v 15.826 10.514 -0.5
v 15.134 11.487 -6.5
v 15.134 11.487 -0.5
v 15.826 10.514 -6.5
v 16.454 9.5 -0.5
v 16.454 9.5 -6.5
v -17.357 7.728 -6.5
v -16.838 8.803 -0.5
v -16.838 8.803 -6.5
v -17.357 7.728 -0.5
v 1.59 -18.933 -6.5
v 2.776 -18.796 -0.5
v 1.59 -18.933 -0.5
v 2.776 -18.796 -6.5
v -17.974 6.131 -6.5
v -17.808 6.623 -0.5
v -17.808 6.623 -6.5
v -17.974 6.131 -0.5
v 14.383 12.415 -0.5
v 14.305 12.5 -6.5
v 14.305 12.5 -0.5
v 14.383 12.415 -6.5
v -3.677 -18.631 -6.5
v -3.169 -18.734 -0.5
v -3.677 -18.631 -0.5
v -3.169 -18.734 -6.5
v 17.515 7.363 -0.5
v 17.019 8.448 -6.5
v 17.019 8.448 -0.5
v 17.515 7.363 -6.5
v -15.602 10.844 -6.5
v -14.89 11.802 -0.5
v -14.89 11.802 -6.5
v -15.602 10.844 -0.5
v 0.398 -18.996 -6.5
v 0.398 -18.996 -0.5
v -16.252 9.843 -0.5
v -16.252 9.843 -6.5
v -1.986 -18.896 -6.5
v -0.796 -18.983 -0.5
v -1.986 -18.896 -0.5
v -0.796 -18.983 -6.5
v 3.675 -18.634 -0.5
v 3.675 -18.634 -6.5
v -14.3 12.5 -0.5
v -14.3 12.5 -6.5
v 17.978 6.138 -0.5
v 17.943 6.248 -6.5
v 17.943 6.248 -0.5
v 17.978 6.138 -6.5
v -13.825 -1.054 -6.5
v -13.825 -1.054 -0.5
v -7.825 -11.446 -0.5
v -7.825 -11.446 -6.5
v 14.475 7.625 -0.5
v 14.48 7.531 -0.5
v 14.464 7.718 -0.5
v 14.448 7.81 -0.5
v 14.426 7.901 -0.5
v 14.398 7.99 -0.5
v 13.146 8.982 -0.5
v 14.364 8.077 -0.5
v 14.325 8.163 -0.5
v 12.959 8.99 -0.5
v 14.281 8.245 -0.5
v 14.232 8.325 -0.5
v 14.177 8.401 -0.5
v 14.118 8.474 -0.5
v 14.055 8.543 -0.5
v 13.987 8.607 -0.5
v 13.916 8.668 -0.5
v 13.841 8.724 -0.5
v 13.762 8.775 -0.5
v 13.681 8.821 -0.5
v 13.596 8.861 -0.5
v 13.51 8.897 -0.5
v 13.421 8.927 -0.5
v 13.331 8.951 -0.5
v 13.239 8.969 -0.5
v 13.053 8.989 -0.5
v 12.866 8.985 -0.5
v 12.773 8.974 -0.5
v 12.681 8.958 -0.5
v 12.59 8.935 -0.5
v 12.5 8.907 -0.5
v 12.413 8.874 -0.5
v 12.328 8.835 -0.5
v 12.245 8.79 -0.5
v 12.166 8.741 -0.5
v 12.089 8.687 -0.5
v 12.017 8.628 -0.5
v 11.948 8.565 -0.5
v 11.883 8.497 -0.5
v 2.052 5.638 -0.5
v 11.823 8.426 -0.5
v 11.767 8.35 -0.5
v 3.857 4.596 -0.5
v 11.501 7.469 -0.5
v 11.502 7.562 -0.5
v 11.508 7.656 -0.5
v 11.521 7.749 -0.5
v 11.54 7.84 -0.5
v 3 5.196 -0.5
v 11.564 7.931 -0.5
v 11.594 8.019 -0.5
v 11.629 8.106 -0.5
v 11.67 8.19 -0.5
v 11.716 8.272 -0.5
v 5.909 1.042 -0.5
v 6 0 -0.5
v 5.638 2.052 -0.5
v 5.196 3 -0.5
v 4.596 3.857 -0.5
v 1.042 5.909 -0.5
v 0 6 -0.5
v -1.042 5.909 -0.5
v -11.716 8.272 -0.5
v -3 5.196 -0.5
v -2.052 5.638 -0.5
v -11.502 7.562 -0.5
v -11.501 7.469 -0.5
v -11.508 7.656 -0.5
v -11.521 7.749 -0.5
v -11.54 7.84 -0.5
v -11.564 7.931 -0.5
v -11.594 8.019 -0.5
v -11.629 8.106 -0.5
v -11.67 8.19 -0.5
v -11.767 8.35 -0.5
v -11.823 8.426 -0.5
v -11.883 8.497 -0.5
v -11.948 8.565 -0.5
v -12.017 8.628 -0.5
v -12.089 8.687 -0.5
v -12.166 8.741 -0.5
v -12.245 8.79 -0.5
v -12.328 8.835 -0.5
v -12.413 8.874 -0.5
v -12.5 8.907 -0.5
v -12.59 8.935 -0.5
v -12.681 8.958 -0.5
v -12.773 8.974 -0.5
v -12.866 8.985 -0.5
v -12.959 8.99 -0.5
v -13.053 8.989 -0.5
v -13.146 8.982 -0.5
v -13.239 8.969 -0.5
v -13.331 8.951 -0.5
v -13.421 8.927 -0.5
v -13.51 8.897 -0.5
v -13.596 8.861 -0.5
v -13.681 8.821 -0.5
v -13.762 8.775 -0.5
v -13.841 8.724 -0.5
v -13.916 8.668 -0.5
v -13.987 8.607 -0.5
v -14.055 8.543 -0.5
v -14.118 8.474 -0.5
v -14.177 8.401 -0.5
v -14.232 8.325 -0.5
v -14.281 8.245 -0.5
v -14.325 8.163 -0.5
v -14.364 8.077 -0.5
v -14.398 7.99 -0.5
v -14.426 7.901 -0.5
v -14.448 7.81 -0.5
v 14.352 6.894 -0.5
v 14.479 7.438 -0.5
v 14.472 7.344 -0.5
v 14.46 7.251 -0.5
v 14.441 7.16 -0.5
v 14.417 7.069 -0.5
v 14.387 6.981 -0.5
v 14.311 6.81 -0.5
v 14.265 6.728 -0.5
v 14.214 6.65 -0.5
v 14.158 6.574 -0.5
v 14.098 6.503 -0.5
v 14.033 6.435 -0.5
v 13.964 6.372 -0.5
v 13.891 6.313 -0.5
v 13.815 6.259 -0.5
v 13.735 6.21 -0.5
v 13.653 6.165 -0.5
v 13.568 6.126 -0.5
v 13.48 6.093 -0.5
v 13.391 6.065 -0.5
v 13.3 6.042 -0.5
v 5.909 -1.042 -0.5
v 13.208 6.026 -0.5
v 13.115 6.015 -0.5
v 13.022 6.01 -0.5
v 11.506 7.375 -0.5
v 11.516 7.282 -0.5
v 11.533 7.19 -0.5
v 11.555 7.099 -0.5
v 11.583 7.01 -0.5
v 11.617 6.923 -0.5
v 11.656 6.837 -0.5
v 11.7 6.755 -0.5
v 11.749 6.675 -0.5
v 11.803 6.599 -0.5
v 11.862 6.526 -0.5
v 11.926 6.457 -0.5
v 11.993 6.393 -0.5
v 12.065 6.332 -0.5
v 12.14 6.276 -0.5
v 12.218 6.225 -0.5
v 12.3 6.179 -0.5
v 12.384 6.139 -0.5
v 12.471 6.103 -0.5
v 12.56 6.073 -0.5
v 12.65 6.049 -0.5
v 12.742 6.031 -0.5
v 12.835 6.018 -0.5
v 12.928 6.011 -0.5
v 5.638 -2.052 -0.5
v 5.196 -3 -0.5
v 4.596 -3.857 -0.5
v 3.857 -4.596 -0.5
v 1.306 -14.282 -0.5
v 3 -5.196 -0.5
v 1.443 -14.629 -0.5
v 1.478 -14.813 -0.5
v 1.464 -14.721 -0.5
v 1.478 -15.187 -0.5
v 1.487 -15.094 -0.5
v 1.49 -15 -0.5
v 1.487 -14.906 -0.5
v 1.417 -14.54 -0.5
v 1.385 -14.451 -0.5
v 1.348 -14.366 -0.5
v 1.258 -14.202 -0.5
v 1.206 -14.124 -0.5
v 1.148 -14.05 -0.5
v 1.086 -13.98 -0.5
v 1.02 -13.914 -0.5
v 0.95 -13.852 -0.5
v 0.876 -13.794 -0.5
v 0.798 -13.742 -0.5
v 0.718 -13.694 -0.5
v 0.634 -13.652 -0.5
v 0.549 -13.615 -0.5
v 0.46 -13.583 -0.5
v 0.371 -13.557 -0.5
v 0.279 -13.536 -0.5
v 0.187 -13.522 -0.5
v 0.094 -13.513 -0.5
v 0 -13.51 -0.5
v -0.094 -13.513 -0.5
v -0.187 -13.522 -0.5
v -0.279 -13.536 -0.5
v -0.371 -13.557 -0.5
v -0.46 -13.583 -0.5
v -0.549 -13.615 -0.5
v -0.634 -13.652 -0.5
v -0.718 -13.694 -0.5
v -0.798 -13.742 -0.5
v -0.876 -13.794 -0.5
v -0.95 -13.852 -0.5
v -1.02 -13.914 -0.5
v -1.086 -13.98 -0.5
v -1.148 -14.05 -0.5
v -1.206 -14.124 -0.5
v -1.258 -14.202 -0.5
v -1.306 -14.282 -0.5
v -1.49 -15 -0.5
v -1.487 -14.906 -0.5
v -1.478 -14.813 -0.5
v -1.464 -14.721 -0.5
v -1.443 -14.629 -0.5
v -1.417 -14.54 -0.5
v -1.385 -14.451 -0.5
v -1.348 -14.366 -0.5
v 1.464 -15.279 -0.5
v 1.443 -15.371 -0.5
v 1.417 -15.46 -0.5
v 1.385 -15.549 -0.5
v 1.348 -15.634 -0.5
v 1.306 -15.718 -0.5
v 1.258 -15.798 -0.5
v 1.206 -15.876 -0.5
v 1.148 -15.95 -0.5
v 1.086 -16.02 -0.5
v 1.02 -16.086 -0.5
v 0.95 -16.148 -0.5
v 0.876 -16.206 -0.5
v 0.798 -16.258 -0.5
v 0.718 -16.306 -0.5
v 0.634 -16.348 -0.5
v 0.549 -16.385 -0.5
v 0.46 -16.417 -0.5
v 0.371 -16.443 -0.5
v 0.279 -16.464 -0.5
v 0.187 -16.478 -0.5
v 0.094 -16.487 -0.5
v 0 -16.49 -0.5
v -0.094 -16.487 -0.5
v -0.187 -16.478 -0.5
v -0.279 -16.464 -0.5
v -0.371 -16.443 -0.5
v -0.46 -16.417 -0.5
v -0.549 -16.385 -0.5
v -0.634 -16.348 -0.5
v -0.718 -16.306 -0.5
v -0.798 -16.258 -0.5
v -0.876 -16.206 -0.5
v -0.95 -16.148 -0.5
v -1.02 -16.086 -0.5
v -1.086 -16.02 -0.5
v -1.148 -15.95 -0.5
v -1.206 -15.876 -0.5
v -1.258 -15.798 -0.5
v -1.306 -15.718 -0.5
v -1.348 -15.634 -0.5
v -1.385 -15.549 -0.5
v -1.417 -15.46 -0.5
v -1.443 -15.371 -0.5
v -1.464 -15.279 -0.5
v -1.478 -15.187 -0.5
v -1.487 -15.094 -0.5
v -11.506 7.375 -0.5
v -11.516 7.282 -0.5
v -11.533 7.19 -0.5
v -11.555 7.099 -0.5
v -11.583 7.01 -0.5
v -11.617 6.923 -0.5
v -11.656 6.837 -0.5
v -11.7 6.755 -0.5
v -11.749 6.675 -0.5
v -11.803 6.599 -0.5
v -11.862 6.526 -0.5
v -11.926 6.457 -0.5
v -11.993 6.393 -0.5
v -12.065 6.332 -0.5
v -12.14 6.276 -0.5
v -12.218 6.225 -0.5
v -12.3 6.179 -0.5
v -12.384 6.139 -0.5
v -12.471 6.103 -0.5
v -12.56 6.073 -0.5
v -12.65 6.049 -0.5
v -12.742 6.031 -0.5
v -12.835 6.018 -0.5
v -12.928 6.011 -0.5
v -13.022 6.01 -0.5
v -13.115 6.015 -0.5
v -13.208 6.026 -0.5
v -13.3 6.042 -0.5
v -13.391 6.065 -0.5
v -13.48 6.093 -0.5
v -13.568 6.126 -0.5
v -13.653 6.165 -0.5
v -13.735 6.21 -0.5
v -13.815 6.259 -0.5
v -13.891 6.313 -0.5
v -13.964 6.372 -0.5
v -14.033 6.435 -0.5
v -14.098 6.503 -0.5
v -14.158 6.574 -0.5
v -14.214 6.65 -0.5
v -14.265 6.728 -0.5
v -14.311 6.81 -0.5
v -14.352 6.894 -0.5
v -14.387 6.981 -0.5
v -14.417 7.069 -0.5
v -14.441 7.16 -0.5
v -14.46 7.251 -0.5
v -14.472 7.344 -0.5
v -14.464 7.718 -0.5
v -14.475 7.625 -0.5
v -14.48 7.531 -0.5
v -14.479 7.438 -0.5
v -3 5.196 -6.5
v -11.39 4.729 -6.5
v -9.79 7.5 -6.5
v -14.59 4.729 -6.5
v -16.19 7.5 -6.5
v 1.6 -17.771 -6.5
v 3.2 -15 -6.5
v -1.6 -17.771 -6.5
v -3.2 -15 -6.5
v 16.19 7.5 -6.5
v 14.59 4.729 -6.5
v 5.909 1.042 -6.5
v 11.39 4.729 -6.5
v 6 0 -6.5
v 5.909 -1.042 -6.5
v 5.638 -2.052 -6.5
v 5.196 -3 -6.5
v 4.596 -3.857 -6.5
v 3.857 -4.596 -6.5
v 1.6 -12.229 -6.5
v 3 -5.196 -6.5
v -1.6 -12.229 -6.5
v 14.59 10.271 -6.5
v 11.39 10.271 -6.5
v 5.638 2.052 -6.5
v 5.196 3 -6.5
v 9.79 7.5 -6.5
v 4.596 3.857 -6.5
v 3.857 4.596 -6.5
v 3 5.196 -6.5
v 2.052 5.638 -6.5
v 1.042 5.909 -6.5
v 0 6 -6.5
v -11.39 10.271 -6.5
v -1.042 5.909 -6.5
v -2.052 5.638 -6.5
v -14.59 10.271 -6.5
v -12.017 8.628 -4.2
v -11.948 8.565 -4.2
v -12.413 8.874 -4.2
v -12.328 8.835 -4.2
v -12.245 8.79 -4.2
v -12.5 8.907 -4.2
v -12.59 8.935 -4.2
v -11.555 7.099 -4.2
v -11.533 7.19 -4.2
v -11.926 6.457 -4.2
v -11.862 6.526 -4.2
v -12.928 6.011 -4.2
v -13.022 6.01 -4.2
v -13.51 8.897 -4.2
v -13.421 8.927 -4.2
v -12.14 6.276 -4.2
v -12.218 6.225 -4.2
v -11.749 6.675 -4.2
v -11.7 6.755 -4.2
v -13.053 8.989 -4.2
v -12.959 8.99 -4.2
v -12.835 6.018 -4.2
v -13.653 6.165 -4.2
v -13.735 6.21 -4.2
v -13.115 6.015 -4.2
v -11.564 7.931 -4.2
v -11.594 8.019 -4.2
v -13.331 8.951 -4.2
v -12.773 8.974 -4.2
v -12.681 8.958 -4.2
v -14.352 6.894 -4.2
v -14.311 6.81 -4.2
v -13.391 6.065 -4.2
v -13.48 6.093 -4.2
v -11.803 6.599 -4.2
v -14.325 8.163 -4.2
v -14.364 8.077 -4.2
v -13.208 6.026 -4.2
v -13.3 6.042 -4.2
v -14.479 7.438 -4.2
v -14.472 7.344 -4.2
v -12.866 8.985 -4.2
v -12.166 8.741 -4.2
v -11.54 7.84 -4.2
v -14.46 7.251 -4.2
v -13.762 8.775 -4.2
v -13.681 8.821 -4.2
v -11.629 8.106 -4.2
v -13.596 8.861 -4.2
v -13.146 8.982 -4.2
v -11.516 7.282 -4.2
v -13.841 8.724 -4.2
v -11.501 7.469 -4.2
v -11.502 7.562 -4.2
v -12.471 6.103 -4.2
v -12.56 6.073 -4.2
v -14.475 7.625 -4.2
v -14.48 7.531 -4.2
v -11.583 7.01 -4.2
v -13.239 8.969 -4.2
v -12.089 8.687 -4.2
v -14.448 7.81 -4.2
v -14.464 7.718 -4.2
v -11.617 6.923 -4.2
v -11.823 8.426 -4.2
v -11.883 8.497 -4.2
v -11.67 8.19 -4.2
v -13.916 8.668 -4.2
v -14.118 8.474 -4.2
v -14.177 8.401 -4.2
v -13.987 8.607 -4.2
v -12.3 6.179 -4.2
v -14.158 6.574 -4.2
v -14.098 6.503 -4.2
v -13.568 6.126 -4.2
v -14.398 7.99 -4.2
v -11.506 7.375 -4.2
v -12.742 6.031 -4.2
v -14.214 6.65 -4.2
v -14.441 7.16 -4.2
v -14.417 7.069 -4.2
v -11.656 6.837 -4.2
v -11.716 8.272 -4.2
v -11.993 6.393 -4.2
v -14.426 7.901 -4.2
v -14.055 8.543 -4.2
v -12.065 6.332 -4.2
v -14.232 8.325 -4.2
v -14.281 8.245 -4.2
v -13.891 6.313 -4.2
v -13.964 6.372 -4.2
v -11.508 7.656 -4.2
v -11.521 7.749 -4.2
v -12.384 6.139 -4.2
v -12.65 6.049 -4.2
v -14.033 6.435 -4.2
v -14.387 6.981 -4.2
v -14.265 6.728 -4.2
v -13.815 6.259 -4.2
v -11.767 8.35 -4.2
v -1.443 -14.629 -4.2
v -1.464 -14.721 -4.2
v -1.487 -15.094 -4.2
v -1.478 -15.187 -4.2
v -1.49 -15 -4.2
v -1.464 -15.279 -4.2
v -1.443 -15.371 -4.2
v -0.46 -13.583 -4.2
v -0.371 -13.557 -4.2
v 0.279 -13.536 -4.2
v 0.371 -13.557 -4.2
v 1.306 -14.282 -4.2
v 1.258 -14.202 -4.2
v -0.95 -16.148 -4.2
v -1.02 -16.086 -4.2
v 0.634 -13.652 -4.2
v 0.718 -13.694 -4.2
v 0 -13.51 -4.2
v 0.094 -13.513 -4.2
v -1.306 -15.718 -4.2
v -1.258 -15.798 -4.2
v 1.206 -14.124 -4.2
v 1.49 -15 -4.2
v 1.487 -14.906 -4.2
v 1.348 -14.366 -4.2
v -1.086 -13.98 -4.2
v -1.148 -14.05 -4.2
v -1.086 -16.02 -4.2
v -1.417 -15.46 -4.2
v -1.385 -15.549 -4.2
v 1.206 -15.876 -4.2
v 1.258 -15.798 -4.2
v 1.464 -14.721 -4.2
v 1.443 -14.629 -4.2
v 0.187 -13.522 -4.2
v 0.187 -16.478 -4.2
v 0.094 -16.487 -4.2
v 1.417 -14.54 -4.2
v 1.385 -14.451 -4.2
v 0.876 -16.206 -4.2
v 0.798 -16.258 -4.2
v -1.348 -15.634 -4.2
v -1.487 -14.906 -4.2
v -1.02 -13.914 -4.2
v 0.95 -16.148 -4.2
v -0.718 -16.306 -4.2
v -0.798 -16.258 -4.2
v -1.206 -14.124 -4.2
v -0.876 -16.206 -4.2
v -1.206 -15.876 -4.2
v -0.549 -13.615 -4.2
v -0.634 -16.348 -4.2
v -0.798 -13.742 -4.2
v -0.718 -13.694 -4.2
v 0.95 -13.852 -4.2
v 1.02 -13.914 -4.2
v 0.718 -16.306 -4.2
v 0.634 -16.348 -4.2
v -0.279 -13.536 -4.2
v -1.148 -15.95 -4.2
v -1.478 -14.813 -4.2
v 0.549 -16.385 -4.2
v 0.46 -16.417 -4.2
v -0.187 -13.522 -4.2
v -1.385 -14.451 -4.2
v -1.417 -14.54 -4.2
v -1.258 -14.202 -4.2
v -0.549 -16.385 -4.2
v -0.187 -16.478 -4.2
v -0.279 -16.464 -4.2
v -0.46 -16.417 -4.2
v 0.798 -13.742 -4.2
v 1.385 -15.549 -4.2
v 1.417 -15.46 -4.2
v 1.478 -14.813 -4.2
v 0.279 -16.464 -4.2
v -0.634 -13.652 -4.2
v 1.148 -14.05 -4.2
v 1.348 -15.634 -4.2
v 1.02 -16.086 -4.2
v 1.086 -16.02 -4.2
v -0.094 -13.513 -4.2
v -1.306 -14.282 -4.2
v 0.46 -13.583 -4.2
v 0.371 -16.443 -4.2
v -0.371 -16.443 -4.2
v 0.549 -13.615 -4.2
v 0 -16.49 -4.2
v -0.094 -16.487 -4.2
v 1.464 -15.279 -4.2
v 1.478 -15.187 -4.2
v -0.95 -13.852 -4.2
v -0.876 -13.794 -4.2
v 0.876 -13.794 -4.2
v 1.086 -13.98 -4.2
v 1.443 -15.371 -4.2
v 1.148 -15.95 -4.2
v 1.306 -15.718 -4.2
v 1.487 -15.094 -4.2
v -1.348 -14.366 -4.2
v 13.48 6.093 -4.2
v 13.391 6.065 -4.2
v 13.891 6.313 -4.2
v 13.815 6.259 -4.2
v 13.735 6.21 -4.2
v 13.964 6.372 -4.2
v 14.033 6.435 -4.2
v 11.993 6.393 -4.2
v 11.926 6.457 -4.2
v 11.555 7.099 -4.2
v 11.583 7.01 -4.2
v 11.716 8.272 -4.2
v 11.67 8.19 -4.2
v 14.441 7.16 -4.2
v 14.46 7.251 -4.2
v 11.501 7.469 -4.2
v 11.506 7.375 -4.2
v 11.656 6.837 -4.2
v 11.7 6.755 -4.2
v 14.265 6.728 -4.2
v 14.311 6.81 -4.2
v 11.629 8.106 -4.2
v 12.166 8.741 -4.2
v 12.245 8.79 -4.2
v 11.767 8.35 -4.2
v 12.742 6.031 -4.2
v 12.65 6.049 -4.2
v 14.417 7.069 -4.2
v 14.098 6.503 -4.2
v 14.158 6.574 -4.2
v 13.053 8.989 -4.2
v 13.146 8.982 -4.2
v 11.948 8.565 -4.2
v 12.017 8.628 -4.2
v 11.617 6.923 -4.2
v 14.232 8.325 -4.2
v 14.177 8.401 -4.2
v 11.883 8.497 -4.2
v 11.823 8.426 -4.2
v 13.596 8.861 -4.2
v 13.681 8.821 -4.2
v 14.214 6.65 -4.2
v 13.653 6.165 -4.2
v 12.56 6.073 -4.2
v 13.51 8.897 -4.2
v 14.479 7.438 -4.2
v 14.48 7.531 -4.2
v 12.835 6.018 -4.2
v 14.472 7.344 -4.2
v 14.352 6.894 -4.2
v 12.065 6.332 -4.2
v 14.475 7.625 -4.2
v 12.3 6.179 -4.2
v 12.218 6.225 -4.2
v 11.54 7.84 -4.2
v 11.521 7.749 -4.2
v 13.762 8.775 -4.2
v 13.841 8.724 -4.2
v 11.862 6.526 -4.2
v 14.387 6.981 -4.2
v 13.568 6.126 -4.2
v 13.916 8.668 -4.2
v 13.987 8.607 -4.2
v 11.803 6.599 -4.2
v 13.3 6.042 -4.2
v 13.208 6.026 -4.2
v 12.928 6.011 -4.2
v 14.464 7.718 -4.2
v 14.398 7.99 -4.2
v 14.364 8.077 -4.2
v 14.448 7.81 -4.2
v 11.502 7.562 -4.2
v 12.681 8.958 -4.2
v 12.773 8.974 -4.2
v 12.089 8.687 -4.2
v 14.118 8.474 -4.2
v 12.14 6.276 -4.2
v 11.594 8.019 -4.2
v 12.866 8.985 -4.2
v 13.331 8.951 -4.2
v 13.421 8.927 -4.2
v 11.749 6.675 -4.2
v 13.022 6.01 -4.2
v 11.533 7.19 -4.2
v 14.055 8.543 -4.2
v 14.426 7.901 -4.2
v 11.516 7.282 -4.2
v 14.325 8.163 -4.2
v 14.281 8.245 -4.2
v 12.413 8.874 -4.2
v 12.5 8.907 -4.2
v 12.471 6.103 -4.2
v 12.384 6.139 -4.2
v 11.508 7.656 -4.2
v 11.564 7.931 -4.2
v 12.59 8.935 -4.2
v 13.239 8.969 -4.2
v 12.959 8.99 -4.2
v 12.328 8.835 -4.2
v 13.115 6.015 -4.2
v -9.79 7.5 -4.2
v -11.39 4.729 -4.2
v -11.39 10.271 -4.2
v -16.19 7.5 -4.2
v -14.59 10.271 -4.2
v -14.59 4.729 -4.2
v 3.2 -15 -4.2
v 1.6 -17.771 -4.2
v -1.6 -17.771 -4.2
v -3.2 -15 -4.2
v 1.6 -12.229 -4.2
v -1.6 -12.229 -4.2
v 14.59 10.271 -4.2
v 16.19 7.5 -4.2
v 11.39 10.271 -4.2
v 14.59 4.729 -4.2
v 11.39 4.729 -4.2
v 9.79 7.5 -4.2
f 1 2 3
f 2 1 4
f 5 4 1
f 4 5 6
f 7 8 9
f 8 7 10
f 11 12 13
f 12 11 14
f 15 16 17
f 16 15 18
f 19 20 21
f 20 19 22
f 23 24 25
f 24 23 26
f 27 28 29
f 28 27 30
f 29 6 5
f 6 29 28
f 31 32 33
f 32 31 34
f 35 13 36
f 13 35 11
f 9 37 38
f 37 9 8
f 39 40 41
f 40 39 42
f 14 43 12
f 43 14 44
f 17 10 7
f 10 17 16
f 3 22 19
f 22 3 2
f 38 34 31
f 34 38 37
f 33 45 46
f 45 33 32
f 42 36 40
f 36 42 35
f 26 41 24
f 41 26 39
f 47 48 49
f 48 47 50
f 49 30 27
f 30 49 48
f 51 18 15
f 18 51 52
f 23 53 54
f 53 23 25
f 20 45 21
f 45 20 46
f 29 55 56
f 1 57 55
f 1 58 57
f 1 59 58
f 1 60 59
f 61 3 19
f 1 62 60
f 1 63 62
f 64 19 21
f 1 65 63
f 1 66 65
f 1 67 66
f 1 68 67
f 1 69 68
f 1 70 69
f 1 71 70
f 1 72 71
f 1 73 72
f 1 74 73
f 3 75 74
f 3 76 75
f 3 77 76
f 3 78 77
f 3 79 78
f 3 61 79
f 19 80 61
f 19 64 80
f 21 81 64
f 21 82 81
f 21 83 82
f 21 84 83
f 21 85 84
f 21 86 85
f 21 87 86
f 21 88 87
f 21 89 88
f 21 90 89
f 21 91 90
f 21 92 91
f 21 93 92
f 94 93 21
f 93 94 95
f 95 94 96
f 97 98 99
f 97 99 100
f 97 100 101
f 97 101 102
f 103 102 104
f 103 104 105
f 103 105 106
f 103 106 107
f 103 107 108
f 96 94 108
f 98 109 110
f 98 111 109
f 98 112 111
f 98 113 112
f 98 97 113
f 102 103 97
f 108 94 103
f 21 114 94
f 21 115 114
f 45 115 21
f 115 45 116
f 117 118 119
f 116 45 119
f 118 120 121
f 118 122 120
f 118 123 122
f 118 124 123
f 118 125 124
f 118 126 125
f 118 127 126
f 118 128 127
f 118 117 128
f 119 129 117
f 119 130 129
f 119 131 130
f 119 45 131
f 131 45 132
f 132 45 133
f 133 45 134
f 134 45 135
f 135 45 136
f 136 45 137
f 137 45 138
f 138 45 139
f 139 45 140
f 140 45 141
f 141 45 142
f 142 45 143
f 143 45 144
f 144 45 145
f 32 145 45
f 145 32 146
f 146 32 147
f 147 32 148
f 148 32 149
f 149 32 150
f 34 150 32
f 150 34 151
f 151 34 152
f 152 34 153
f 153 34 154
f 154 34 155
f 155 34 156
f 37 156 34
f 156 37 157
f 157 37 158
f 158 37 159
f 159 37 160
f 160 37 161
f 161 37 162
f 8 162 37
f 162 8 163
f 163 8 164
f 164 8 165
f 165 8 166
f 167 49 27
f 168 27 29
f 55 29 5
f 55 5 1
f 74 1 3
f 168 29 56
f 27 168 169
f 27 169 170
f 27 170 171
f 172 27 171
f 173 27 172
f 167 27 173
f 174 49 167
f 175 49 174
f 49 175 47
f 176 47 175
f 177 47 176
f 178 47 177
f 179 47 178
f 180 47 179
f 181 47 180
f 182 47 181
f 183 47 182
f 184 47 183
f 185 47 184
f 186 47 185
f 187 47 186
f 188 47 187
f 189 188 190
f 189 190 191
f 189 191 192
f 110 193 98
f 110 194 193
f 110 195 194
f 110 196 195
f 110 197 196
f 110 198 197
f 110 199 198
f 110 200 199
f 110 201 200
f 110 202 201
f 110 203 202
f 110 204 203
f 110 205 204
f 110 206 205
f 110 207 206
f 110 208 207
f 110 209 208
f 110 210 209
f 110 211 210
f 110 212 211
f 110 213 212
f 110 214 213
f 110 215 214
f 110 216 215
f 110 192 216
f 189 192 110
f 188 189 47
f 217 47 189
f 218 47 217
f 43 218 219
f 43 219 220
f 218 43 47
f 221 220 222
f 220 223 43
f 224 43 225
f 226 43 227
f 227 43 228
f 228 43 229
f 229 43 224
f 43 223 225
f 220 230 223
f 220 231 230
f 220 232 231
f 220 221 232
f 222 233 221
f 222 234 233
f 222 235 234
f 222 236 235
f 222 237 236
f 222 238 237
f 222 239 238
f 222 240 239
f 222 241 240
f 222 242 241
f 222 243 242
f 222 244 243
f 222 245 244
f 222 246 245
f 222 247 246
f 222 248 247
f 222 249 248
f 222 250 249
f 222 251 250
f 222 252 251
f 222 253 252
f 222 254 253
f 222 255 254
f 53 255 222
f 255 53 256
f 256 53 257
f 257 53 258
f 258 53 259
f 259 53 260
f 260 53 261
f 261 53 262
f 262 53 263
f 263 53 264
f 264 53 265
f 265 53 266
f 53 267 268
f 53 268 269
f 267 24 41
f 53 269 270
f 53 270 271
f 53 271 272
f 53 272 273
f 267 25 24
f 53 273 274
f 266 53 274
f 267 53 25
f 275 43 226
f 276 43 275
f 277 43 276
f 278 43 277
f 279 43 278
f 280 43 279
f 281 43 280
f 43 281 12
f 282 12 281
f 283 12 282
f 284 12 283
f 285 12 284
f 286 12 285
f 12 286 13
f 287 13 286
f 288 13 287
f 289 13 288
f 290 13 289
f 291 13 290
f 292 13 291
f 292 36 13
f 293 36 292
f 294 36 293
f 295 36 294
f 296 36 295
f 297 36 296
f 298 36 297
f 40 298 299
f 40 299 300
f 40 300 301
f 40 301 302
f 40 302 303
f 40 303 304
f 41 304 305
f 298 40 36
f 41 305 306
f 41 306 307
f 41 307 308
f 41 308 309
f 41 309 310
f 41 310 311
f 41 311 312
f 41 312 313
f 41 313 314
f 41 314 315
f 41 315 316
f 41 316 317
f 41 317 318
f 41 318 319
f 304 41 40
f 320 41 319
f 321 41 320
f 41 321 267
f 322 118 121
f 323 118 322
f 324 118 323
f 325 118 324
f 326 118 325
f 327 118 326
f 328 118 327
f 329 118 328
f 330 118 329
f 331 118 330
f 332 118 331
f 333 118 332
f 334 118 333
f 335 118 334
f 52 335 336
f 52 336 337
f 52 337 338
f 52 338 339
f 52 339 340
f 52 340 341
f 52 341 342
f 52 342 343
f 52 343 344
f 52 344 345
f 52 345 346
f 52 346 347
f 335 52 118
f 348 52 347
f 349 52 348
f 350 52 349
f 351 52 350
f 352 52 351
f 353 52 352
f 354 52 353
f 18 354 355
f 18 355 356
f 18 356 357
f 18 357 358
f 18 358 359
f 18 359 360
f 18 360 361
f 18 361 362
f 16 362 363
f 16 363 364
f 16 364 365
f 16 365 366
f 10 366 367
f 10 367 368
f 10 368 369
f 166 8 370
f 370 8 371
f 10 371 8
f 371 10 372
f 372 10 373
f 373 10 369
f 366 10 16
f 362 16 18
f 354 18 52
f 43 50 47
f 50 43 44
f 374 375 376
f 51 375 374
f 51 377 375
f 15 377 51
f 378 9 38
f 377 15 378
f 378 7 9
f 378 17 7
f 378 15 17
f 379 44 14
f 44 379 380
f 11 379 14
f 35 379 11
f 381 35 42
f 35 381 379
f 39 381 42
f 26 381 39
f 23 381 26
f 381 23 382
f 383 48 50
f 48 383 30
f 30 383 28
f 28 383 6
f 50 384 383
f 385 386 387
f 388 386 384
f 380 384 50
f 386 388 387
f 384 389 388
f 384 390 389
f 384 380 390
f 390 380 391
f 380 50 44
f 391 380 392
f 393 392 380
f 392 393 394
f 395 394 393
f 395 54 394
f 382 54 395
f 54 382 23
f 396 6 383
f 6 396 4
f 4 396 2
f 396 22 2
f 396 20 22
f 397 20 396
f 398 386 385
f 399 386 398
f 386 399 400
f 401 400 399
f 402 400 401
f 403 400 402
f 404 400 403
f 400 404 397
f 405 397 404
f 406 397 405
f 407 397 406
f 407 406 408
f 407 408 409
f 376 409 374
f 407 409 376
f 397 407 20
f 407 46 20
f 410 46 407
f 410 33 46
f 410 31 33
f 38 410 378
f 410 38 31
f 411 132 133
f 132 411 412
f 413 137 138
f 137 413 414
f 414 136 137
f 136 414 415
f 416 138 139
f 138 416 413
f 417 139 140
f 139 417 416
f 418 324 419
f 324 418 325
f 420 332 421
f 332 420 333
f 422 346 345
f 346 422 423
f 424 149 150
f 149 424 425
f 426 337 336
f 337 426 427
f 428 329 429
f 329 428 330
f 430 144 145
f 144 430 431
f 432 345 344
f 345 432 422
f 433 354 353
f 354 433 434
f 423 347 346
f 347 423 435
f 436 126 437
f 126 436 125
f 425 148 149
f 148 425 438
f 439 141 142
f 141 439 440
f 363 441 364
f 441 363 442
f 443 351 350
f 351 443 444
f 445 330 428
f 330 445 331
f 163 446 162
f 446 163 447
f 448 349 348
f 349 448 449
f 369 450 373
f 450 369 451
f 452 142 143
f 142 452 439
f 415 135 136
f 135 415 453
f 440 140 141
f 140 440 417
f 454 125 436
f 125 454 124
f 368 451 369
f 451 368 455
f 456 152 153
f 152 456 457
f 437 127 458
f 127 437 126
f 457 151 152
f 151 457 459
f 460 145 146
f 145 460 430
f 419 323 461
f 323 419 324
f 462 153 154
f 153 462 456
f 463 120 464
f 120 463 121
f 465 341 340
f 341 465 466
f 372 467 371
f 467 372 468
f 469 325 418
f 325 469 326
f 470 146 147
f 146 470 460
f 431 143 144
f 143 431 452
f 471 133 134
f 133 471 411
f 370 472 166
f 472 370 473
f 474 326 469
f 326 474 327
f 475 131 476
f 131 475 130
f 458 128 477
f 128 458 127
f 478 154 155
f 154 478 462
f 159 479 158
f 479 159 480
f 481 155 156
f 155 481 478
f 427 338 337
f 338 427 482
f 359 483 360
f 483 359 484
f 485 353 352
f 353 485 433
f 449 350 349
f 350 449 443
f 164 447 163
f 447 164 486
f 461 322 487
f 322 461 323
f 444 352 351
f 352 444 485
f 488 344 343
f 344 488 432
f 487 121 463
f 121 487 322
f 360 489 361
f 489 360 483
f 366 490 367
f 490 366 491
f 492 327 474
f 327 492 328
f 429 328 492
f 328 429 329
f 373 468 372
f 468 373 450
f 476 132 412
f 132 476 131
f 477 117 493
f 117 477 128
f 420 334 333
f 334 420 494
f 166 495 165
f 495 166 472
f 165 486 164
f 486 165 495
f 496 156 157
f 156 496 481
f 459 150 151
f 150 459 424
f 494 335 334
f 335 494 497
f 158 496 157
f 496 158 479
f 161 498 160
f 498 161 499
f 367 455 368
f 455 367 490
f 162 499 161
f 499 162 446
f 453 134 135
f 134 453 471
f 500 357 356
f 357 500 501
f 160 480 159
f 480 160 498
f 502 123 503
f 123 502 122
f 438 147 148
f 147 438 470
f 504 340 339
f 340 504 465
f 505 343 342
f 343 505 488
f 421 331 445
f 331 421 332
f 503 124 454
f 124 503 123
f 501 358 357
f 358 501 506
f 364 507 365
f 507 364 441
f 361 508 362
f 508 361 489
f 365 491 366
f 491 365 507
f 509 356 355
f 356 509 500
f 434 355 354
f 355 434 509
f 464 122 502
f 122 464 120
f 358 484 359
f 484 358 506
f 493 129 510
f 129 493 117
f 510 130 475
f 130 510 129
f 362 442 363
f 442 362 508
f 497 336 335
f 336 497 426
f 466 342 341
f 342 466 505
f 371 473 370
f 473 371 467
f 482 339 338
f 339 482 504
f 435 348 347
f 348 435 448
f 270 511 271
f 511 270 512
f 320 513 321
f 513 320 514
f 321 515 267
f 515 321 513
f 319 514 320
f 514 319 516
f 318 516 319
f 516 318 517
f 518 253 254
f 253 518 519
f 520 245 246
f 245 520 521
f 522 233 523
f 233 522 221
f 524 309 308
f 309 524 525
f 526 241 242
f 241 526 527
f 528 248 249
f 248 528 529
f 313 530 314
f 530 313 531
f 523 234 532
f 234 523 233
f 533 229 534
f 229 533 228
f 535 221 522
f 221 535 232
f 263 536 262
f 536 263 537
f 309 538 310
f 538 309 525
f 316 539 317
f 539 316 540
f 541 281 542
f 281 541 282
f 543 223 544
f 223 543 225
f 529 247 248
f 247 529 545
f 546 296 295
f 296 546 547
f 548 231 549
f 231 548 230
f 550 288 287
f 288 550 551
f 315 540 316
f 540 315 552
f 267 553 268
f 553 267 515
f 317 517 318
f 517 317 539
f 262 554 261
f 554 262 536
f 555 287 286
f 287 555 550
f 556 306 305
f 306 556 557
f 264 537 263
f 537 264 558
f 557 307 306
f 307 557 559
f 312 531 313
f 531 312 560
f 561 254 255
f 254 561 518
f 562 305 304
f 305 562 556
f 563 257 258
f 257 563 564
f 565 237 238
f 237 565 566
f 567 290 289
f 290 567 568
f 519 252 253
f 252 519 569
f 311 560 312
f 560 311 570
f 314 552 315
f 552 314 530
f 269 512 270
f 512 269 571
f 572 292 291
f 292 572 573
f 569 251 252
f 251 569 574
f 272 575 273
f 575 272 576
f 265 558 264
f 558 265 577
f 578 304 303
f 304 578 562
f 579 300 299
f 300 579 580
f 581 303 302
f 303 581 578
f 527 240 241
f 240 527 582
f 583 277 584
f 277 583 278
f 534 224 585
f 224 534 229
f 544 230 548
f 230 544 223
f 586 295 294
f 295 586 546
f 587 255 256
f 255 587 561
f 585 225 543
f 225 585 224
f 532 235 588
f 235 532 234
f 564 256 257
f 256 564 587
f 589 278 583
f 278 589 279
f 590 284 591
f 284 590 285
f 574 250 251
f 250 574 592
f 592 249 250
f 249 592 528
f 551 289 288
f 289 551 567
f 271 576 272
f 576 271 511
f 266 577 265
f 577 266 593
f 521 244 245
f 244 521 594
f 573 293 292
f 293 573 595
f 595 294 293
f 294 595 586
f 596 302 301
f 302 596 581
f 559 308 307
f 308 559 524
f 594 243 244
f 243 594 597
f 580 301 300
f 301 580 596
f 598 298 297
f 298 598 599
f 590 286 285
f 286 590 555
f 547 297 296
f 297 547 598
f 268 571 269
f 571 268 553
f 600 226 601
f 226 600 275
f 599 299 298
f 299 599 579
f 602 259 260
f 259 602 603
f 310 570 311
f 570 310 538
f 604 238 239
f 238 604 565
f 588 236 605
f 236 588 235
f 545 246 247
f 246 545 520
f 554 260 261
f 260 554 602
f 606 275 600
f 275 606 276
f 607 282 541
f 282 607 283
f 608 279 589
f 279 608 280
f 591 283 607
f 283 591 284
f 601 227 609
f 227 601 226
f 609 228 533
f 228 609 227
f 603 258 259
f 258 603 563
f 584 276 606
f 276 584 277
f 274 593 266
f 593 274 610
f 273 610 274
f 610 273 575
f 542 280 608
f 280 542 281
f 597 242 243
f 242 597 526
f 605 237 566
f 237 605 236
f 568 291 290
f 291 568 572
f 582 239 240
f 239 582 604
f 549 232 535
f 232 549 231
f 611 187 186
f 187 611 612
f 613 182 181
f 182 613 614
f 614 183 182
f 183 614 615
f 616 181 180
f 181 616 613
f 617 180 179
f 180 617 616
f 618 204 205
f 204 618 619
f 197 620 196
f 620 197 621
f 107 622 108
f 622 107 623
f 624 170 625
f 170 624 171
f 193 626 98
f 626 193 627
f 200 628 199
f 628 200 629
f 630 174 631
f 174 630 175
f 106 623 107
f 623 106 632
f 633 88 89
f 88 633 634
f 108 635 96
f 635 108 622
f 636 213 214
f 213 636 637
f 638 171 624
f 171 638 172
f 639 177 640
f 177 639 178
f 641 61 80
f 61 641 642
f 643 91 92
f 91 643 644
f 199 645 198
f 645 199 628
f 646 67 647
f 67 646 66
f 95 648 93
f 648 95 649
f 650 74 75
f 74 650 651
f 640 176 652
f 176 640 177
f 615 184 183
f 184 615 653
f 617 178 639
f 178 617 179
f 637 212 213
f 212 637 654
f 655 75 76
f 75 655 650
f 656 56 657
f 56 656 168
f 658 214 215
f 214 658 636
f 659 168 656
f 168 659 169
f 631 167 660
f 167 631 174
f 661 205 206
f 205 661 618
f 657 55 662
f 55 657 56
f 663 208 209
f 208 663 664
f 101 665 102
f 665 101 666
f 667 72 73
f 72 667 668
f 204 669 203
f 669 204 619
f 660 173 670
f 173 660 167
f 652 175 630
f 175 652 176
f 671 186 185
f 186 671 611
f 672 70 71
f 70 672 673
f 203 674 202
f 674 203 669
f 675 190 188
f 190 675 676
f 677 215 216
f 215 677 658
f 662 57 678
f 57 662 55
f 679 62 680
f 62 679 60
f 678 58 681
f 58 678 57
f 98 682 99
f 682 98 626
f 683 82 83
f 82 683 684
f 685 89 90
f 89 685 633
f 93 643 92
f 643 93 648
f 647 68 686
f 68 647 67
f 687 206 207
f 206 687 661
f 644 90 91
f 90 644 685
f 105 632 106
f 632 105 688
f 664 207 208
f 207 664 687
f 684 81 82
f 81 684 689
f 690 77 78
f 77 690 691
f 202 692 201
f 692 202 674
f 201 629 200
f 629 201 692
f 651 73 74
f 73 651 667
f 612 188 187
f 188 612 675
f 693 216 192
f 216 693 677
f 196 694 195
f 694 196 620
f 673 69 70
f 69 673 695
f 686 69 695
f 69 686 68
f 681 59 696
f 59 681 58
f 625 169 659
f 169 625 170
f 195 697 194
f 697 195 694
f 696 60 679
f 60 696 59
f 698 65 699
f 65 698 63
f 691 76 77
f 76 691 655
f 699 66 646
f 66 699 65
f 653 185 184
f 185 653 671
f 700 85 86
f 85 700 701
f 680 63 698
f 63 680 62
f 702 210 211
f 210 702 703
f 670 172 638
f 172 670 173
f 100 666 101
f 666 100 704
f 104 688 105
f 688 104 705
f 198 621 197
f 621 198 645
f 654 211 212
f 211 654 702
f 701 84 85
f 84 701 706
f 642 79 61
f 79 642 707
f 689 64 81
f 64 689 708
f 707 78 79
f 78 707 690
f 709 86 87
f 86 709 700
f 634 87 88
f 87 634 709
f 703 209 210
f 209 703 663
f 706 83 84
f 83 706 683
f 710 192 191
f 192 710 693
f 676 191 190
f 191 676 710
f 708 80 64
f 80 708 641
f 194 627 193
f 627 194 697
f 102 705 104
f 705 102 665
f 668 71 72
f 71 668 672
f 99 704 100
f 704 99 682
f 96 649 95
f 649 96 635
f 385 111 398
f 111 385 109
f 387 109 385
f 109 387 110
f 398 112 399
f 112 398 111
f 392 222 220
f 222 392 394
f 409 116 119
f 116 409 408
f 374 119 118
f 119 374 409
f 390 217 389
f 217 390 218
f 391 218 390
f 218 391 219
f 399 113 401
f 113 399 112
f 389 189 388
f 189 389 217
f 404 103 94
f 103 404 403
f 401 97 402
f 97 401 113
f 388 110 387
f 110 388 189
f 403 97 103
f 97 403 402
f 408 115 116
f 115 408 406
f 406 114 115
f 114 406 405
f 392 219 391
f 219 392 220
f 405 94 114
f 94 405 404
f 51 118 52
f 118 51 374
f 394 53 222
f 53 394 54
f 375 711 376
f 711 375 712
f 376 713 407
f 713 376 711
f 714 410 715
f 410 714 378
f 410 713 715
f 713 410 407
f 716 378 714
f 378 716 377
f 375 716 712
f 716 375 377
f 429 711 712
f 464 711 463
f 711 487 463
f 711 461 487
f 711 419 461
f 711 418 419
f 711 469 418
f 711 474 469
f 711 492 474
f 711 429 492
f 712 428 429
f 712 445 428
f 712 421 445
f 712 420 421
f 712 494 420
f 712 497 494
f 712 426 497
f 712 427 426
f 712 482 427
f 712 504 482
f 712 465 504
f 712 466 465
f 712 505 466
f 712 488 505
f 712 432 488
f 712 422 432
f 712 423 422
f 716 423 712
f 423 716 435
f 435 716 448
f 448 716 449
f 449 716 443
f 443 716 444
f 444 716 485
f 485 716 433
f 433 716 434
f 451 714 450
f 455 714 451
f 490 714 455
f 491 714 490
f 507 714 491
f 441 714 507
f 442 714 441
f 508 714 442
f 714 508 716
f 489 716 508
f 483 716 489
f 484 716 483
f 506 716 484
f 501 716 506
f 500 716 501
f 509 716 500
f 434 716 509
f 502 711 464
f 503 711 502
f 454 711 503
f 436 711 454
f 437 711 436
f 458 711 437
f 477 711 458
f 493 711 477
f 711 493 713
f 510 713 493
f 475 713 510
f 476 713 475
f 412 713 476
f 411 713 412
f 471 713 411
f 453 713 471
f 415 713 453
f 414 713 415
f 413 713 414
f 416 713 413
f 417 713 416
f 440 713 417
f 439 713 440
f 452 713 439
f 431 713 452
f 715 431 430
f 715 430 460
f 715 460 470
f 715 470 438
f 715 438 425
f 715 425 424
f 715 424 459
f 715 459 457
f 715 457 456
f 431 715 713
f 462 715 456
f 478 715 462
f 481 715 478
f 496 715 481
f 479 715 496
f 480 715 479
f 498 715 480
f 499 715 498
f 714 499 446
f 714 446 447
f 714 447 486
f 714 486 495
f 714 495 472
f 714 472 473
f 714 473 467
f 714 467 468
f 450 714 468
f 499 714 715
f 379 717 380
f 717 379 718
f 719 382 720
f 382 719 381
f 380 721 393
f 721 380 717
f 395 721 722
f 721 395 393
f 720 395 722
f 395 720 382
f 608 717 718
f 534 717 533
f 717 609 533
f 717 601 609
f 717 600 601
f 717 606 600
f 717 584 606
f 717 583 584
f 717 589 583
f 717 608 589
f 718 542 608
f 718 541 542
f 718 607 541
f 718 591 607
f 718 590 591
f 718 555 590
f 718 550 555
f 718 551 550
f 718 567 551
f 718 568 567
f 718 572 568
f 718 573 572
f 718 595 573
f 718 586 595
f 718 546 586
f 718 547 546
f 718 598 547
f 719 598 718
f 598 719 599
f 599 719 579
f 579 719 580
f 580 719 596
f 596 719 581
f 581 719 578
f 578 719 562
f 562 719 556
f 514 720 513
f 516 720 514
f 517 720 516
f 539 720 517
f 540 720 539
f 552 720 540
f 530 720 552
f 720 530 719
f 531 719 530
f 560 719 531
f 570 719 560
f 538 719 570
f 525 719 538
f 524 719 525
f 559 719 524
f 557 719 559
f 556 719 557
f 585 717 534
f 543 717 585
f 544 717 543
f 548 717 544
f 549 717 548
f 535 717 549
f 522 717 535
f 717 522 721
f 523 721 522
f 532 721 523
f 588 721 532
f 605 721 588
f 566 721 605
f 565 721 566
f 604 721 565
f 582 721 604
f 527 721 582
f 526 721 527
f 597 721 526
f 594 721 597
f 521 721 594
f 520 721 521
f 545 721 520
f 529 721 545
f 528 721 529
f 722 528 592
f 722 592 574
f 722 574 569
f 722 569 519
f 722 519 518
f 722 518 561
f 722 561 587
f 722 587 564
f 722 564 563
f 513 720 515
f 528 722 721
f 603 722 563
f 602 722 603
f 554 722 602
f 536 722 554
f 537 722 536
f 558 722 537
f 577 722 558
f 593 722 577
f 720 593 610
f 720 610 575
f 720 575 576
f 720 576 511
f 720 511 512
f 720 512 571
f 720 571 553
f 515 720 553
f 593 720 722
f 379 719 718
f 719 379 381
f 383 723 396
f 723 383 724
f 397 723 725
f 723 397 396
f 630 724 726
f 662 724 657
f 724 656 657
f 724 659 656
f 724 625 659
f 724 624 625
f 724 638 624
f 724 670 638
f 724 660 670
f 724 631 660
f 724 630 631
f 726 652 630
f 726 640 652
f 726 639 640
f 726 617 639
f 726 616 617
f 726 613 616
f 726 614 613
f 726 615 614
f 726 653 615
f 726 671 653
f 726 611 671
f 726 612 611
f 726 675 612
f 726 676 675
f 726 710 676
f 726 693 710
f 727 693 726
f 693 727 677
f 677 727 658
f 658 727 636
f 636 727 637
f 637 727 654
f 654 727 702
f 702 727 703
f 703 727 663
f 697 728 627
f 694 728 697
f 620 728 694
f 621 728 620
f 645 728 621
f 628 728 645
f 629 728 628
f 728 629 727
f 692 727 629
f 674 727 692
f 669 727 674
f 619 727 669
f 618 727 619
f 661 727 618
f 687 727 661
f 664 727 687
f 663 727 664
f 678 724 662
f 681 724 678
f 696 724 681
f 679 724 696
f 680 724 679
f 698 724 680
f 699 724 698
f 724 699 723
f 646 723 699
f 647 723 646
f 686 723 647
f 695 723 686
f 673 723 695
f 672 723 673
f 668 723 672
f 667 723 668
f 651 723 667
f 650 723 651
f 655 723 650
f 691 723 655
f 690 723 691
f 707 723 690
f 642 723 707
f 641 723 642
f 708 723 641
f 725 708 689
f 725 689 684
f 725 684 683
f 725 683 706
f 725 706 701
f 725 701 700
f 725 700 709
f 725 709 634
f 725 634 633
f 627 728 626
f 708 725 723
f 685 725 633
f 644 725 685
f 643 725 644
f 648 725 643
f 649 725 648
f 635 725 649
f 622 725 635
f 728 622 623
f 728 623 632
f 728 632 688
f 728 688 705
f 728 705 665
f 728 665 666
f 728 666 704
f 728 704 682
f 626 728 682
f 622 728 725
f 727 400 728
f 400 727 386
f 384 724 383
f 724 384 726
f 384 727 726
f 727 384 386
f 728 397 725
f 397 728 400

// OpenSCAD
use <MCAD/nuts_and_bolts.scad>;

jhead_height = 6.0; 

centers = 50;

$fn=100;



top_mag_size = 10.3;
hotend_radius = 12;  // Hole for the hotend (J-Head diameter is 16mm).
mount_radius = 18.5;

module rounded_triangle(tsize,theight)
{
    difference(){
      translate([0,0,0]) cylinder(r=tsize,h=theight,$fn=3);
      translate([0,0,-.1]) ring(tsize-6,theight+.2,20);
      }
}

module ring(ra,ha,ta)
{
    difference(){
        cylinder(r=ra+ta,h=ha);
        translate([0,0,-.1]) cylinder(r=ra,h=ha+.2);
    }
}



module holed_triangle(thesize,width,thickness)
{
    difference(){
        rounded_triangle(thesize,thickness);
        translate([0,0,-.1]) rounded_triangle(thesize-width,thickness+.2);
    }
}
    


module e3d_mount()
{
   difference(){
        rotate([0,0,30])  translate([0,0,-6.5]) rounded_triangle(25,jhead_height); 
        translate([0, 0, -6.6])
            cylinder(r=hotend_radius/2 , h=jhead_height+.2, $fn=36);
        rotate([0,0,120+90]) translate([0, -hotend_radius/2, -6.6])
             cube([20,hotend_radius,jhead_height+.2]);
        rotate([0,0,60]) translate([0,15,-6.6]) boltHole(3.1,length=15);
        rotate([0,0,180]) translate([0,15,-6.6]) boltHole(3.1,length=15);
        rotate([0,0,300]) translate([0,15,-6.6]) boltHole(3.1,length=15);
        rotate([0,0,60]) translate([0,15,-6.6]) nutHole(3.1,length=15);
        rotate([0,0,180]) translate([0,15,-6.6]) nutHole(3.1,length=15);
        rotate([0,0,300]) translate([0,15,-6.6]) nutHole(3.1,length=15);
        rotate([0,0,60]) translate([-3,27,-10]) cube([6,3,20]);
        }    
    
}

e3d_mount();
